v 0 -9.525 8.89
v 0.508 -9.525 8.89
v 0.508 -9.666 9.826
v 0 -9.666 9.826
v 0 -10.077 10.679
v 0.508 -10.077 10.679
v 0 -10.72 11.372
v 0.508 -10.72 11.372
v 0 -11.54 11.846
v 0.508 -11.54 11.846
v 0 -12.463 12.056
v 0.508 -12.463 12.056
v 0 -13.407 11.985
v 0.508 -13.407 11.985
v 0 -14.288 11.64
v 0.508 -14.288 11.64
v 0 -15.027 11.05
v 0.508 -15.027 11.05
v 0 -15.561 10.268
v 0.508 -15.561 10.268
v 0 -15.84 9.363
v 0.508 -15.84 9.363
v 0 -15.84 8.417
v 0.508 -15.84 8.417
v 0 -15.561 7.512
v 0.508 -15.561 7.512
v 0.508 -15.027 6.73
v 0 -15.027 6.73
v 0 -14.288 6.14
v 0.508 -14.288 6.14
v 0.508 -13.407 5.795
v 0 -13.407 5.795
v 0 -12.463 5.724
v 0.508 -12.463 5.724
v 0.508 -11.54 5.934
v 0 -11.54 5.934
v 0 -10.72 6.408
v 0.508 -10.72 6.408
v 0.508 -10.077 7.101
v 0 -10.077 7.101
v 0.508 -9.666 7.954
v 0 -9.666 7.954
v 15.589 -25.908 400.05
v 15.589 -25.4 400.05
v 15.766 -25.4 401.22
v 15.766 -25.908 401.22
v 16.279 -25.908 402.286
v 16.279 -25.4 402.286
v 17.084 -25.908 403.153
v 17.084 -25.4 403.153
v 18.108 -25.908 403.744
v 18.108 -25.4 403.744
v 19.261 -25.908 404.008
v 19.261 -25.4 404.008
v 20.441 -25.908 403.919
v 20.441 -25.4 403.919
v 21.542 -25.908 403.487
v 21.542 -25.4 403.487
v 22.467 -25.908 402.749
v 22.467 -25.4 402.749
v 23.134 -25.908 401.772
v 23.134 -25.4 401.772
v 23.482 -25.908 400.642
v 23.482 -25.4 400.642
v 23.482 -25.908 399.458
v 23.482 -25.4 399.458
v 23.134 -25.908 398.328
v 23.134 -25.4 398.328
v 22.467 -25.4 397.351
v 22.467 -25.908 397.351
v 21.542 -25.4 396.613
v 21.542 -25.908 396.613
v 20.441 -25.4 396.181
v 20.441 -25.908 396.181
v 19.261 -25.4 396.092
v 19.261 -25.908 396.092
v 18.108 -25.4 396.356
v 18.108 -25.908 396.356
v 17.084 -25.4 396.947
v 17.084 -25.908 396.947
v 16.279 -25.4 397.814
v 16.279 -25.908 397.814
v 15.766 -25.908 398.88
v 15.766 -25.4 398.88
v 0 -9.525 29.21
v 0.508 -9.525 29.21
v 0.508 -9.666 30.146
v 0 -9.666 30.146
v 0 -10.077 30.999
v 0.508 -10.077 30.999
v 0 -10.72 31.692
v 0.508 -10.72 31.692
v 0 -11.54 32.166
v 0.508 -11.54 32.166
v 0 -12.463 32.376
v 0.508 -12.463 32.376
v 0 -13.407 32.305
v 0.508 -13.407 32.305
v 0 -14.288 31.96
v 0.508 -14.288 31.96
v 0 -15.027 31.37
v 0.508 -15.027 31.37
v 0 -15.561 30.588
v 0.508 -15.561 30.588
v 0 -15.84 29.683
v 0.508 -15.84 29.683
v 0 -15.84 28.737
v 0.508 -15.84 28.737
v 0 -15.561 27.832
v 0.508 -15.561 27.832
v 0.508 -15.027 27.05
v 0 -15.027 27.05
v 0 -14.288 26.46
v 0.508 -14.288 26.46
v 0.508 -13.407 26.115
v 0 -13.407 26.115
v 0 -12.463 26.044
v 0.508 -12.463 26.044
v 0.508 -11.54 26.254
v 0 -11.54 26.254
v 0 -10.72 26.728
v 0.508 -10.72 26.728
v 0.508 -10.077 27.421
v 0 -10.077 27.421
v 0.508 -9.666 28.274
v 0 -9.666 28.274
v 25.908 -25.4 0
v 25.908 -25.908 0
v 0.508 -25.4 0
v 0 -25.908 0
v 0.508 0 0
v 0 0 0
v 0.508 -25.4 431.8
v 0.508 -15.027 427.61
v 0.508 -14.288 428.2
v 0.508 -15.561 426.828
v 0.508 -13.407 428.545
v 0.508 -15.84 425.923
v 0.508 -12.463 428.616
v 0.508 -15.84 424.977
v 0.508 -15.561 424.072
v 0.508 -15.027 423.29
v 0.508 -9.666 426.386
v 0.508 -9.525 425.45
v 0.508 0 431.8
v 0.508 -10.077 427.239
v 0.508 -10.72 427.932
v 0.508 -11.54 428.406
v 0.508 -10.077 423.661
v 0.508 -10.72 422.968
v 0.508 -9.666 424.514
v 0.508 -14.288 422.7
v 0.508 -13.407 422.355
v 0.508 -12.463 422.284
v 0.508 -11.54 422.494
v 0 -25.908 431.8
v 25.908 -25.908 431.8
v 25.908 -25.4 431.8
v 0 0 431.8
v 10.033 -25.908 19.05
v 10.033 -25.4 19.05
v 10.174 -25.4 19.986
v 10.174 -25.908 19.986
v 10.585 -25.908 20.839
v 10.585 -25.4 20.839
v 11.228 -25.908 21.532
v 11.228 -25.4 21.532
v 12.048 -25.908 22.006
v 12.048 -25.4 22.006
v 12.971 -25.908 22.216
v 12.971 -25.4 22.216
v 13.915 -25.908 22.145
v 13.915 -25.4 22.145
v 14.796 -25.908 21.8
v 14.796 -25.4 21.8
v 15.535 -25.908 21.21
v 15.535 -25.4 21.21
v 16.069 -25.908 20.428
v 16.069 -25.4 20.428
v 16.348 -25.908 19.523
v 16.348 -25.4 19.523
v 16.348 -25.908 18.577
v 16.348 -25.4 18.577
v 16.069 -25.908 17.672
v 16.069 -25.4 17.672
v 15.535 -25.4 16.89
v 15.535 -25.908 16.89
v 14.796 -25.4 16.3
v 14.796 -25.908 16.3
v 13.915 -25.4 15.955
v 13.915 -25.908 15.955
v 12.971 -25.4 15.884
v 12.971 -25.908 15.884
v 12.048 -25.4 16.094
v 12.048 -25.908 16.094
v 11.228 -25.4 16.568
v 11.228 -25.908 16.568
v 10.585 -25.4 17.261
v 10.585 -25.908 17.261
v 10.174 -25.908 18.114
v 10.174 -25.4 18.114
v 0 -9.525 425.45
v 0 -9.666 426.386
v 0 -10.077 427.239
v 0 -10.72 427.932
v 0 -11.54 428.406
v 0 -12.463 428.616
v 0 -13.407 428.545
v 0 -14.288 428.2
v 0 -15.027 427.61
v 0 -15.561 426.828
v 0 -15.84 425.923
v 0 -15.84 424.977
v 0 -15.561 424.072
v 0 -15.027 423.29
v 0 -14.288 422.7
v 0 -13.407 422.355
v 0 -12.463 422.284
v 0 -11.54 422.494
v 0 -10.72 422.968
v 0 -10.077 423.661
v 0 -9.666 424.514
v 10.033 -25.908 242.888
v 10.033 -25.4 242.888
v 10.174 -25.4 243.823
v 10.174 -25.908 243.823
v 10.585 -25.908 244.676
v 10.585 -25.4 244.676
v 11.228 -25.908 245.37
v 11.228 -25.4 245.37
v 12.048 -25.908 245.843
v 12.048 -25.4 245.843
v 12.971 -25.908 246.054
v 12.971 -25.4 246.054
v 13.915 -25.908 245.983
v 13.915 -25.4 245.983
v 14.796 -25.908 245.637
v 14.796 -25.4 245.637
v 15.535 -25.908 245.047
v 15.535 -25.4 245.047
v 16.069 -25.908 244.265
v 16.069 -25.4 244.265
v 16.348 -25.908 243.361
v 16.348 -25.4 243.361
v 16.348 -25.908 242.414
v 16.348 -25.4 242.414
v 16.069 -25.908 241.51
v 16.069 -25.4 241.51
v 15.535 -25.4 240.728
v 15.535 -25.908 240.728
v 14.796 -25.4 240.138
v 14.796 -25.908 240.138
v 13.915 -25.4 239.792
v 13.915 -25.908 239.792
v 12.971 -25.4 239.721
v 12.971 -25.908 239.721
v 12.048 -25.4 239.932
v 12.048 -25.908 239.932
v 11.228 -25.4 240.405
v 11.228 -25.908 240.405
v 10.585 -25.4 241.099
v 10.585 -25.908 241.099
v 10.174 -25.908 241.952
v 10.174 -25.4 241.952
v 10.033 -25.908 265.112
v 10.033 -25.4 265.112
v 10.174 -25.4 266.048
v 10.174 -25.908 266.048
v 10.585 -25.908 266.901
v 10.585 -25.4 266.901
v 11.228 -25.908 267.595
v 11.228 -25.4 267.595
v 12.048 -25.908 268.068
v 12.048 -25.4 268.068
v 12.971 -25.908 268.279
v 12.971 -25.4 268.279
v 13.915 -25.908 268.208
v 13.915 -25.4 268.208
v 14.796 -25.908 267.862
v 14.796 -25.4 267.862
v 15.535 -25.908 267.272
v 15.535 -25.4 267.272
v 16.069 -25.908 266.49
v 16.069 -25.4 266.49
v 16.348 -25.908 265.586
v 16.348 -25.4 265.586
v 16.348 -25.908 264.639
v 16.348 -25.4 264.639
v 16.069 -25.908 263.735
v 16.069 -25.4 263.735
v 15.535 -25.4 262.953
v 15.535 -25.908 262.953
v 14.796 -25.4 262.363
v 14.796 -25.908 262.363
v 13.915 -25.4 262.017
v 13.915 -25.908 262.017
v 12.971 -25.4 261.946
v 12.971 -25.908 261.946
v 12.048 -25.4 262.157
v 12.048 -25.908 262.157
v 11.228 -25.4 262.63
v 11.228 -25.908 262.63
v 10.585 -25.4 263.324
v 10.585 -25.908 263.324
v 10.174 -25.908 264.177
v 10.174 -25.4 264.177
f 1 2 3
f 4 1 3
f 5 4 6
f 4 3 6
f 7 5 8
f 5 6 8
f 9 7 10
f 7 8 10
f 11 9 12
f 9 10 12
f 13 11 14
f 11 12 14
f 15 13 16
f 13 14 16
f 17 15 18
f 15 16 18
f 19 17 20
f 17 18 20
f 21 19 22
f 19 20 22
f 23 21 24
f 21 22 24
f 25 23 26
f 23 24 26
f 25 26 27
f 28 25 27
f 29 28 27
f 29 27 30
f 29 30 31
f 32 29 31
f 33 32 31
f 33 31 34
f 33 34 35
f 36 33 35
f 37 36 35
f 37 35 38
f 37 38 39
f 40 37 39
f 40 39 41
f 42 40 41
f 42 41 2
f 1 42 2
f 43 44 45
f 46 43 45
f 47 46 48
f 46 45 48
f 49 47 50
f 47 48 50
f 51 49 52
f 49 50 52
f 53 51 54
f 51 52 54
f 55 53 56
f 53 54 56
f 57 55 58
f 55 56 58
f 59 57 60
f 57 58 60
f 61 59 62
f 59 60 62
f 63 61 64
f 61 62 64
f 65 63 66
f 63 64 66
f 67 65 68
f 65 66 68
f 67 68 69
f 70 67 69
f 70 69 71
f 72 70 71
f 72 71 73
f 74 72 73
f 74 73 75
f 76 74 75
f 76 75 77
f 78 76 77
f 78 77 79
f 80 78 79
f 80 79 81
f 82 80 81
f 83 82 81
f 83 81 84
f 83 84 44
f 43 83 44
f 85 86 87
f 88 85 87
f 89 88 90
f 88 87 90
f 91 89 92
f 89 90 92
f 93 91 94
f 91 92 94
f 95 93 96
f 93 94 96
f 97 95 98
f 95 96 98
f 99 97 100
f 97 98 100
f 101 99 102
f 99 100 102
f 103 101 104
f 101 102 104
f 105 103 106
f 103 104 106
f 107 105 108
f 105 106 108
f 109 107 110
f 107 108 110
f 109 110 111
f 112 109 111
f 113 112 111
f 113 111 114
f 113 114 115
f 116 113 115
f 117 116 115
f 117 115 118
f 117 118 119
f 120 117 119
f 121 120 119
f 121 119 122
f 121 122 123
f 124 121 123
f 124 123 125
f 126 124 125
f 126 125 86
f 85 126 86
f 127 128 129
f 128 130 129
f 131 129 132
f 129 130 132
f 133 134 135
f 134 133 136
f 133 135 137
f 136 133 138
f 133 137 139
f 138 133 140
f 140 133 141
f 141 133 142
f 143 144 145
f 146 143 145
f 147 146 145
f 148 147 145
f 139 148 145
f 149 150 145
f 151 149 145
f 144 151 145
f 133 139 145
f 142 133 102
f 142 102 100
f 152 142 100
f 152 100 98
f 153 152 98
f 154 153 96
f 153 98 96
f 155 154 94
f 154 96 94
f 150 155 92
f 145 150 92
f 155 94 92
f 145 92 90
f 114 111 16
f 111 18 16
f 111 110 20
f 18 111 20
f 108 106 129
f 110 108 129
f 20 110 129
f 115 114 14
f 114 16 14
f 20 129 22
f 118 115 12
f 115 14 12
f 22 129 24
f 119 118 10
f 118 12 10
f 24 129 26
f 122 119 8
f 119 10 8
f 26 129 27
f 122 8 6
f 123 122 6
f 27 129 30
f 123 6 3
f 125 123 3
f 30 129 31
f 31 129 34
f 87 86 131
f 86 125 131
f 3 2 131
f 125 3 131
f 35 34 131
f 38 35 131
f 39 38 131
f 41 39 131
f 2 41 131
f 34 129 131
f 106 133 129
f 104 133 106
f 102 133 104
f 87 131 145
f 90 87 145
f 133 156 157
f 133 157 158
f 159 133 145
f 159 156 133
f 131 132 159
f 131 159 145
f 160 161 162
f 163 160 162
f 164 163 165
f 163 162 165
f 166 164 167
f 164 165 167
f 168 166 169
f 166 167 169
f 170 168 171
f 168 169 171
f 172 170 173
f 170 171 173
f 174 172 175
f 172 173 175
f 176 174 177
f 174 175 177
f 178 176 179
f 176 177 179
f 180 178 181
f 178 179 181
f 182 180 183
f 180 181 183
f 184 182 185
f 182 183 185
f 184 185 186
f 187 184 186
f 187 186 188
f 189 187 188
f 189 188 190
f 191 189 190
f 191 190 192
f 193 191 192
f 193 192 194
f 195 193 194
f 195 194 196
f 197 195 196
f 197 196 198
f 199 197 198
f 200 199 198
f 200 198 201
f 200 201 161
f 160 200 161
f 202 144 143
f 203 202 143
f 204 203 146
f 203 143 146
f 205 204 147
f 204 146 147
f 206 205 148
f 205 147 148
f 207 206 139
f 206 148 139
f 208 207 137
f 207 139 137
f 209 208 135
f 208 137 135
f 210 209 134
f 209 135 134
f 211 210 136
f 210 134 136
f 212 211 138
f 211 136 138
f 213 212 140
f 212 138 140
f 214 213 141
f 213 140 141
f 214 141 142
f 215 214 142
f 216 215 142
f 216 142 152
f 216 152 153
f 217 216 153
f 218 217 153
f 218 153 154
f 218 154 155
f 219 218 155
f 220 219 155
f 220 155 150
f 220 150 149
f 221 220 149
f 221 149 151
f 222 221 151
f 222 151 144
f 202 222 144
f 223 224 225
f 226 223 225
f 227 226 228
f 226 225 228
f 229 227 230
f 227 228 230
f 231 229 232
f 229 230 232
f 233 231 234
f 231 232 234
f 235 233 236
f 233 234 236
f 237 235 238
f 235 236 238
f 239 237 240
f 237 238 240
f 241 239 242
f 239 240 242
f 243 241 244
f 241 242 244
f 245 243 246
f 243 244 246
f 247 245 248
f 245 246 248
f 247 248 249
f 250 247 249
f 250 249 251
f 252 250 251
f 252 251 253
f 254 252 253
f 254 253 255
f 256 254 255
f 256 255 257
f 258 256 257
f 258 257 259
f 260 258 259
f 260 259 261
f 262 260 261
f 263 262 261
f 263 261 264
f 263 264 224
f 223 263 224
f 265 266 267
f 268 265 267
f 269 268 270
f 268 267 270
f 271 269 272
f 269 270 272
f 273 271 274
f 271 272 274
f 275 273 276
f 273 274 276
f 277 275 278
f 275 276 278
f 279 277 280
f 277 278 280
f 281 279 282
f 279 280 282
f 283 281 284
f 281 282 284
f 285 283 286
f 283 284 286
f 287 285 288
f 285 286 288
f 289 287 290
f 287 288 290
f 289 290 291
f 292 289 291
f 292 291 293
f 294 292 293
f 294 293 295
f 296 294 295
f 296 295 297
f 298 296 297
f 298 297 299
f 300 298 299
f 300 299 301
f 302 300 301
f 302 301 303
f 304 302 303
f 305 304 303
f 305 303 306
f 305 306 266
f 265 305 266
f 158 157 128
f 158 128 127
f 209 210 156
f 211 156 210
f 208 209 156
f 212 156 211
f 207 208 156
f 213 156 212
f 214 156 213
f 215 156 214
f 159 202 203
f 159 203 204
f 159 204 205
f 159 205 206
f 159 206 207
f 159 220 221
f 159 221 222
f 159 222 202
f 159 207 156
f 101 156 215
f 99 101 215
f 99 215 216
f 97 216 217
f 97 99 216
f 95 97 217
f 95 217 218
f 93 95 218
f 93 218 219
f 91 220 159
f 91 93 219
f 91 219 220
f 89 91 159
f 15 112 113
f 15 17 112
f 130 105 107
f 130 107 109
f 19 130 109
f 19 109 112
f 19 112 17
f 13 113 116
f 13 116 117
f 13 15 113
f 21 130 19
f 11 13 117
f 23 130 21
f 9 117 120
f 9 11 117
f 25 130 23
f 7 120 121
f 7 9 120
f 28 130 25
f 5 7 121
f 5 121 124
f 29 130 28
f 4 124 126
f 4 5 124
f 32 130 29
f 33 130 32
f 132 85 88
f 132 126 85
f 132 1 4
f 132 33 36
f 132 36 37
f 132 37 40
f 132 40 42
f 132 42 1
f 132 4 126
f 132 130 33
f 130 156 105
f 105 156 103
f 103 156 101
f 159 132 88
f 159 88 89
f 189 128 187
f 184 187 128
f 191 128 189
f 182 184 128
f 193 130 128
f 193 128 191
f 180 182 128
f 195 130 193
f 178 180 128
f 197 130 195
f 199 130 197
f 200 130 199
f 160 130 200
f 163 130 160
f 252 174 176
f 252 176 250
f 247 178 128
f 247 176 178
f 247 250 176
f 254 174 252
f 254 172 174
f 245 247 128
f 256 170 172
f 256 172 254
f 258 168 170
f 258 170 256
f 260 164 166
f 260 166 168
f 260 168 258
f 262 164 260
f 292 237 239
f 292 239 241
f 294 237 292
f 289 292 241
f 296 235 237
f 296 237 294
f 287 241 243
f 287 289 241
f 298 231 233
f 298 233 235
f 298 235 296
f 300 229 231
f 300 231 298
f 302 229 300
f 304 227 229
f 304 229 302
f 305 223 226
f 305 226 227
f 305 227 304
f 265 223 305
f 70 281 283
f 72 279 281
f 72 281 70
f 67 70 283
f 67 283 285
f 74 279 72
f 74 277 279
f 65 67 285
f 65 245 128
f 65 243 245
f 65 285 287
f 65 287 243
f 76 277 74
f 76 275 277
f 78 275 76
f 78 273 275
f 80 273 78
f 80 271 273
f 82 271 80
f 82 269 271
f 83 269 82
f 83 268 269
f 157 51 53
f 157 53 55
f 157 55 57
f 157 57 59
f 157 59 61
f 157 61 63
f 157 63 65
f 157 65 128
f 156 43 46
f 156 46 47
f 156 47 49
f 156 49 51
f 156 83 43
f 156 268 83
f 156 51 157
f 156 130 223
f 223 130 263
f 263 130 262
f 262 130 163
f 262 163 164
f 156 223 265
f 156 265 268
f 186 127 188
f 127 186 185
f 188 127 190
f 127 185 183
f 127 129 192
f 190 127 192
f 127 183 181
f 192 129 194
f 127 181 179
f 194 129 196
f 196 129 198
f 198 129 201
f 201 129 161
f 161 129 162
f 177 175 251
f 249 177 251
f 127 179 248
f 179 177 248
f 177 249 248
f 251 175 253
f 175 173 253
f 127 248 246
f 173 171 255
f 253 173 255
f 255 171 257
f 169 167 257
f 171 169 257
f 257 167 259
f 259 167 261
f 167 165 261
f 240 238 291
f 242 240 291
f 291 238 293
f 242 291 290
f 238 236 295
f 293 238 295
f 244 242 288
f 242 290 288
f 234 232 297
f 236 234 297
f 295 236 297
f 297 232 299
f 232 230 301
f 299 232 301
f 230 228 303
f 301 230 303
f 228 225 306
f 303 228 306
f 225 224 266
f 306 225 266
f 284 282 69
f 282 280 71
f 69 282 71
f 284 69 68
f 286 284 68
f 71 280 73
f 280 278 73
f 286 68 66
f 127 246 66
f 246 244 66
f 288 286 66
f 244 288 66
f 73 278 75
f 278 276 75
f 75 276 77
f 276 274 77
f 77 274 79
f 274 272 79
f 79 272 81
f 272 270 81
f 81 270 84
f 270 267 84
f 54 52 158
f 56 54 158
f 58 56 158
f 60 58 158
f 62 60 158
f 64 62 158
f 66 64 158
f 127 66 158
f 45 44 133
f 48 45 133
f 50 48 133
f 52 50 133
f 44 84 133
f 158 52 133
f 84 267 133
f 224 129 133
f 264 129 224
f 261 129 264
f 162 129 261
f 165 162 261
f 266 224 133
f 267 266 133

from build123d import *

# Parameters (mm, degrees)
F0_W     = 0.508
F0_H     = 25.908
F1_DEPTH = 431.8
F2_W     = 0.508
F2_H     = 431.8
F3_DEPTH = 25.4
F4_R     = 3.175
F5_DEPTH = 25.4
F6_R     = 3.96875
F6_R_2   = 3.175
F7_DEPTH = 25.4


with BuildPart() as f1:
    # F0 (on Top) → F1 (new body)
    with BuildSketch(Plane.XY):
        with Locations((0.254, -12.954)):
            Rectangle(F0_W, F0_H)
    extrude(amount=F1_DEPTH)

    # F2 (on face) → F3 (join)
    with BuildSketch(Plane.YZ.offset(0.508)):
        with Locations((-25.654, 215.9)):
            Rectangle(F2_W, F2_H)
    extrude(amount=F3_DEPTH)

    # F4 (on face) → F5 (cut)
    with BuildSketch(Plane.YZ.offset(0.508)):
        with Locations((-12.7, 425.45)):
            Circle(F4_R)
        with Locations((-12.7, 29.21)):
            Circle(F4_R)
        with Locations((-12.7, 8.89)):
            Circle(F4_R)
    extrude(amount=-F5_DEPTH, mode=Mode.SUBTRACT)

    # F6 (on face) → F7 (cut)
    with BuildSketch(Plane(origin=(0, -25.4, 0), x_dir=(-1, 0, 0), z_dir=(0, 1, 0))):
        with Locations((-19.558, 400.05)):
            Circle(F6_R)
        with Locations((-13.208, 265.1125)):
            Circle(F6_R_2)
        with Locations((-13.208, 242.8875)):
            Circle(F6_R_2)
        with Locations((-13.208, 19.05)):
            Circle(F6_R_2)
    extrude(amount=-F7_DEPTH, mode=Mode.SUBTRACT)


solid = f1.part
